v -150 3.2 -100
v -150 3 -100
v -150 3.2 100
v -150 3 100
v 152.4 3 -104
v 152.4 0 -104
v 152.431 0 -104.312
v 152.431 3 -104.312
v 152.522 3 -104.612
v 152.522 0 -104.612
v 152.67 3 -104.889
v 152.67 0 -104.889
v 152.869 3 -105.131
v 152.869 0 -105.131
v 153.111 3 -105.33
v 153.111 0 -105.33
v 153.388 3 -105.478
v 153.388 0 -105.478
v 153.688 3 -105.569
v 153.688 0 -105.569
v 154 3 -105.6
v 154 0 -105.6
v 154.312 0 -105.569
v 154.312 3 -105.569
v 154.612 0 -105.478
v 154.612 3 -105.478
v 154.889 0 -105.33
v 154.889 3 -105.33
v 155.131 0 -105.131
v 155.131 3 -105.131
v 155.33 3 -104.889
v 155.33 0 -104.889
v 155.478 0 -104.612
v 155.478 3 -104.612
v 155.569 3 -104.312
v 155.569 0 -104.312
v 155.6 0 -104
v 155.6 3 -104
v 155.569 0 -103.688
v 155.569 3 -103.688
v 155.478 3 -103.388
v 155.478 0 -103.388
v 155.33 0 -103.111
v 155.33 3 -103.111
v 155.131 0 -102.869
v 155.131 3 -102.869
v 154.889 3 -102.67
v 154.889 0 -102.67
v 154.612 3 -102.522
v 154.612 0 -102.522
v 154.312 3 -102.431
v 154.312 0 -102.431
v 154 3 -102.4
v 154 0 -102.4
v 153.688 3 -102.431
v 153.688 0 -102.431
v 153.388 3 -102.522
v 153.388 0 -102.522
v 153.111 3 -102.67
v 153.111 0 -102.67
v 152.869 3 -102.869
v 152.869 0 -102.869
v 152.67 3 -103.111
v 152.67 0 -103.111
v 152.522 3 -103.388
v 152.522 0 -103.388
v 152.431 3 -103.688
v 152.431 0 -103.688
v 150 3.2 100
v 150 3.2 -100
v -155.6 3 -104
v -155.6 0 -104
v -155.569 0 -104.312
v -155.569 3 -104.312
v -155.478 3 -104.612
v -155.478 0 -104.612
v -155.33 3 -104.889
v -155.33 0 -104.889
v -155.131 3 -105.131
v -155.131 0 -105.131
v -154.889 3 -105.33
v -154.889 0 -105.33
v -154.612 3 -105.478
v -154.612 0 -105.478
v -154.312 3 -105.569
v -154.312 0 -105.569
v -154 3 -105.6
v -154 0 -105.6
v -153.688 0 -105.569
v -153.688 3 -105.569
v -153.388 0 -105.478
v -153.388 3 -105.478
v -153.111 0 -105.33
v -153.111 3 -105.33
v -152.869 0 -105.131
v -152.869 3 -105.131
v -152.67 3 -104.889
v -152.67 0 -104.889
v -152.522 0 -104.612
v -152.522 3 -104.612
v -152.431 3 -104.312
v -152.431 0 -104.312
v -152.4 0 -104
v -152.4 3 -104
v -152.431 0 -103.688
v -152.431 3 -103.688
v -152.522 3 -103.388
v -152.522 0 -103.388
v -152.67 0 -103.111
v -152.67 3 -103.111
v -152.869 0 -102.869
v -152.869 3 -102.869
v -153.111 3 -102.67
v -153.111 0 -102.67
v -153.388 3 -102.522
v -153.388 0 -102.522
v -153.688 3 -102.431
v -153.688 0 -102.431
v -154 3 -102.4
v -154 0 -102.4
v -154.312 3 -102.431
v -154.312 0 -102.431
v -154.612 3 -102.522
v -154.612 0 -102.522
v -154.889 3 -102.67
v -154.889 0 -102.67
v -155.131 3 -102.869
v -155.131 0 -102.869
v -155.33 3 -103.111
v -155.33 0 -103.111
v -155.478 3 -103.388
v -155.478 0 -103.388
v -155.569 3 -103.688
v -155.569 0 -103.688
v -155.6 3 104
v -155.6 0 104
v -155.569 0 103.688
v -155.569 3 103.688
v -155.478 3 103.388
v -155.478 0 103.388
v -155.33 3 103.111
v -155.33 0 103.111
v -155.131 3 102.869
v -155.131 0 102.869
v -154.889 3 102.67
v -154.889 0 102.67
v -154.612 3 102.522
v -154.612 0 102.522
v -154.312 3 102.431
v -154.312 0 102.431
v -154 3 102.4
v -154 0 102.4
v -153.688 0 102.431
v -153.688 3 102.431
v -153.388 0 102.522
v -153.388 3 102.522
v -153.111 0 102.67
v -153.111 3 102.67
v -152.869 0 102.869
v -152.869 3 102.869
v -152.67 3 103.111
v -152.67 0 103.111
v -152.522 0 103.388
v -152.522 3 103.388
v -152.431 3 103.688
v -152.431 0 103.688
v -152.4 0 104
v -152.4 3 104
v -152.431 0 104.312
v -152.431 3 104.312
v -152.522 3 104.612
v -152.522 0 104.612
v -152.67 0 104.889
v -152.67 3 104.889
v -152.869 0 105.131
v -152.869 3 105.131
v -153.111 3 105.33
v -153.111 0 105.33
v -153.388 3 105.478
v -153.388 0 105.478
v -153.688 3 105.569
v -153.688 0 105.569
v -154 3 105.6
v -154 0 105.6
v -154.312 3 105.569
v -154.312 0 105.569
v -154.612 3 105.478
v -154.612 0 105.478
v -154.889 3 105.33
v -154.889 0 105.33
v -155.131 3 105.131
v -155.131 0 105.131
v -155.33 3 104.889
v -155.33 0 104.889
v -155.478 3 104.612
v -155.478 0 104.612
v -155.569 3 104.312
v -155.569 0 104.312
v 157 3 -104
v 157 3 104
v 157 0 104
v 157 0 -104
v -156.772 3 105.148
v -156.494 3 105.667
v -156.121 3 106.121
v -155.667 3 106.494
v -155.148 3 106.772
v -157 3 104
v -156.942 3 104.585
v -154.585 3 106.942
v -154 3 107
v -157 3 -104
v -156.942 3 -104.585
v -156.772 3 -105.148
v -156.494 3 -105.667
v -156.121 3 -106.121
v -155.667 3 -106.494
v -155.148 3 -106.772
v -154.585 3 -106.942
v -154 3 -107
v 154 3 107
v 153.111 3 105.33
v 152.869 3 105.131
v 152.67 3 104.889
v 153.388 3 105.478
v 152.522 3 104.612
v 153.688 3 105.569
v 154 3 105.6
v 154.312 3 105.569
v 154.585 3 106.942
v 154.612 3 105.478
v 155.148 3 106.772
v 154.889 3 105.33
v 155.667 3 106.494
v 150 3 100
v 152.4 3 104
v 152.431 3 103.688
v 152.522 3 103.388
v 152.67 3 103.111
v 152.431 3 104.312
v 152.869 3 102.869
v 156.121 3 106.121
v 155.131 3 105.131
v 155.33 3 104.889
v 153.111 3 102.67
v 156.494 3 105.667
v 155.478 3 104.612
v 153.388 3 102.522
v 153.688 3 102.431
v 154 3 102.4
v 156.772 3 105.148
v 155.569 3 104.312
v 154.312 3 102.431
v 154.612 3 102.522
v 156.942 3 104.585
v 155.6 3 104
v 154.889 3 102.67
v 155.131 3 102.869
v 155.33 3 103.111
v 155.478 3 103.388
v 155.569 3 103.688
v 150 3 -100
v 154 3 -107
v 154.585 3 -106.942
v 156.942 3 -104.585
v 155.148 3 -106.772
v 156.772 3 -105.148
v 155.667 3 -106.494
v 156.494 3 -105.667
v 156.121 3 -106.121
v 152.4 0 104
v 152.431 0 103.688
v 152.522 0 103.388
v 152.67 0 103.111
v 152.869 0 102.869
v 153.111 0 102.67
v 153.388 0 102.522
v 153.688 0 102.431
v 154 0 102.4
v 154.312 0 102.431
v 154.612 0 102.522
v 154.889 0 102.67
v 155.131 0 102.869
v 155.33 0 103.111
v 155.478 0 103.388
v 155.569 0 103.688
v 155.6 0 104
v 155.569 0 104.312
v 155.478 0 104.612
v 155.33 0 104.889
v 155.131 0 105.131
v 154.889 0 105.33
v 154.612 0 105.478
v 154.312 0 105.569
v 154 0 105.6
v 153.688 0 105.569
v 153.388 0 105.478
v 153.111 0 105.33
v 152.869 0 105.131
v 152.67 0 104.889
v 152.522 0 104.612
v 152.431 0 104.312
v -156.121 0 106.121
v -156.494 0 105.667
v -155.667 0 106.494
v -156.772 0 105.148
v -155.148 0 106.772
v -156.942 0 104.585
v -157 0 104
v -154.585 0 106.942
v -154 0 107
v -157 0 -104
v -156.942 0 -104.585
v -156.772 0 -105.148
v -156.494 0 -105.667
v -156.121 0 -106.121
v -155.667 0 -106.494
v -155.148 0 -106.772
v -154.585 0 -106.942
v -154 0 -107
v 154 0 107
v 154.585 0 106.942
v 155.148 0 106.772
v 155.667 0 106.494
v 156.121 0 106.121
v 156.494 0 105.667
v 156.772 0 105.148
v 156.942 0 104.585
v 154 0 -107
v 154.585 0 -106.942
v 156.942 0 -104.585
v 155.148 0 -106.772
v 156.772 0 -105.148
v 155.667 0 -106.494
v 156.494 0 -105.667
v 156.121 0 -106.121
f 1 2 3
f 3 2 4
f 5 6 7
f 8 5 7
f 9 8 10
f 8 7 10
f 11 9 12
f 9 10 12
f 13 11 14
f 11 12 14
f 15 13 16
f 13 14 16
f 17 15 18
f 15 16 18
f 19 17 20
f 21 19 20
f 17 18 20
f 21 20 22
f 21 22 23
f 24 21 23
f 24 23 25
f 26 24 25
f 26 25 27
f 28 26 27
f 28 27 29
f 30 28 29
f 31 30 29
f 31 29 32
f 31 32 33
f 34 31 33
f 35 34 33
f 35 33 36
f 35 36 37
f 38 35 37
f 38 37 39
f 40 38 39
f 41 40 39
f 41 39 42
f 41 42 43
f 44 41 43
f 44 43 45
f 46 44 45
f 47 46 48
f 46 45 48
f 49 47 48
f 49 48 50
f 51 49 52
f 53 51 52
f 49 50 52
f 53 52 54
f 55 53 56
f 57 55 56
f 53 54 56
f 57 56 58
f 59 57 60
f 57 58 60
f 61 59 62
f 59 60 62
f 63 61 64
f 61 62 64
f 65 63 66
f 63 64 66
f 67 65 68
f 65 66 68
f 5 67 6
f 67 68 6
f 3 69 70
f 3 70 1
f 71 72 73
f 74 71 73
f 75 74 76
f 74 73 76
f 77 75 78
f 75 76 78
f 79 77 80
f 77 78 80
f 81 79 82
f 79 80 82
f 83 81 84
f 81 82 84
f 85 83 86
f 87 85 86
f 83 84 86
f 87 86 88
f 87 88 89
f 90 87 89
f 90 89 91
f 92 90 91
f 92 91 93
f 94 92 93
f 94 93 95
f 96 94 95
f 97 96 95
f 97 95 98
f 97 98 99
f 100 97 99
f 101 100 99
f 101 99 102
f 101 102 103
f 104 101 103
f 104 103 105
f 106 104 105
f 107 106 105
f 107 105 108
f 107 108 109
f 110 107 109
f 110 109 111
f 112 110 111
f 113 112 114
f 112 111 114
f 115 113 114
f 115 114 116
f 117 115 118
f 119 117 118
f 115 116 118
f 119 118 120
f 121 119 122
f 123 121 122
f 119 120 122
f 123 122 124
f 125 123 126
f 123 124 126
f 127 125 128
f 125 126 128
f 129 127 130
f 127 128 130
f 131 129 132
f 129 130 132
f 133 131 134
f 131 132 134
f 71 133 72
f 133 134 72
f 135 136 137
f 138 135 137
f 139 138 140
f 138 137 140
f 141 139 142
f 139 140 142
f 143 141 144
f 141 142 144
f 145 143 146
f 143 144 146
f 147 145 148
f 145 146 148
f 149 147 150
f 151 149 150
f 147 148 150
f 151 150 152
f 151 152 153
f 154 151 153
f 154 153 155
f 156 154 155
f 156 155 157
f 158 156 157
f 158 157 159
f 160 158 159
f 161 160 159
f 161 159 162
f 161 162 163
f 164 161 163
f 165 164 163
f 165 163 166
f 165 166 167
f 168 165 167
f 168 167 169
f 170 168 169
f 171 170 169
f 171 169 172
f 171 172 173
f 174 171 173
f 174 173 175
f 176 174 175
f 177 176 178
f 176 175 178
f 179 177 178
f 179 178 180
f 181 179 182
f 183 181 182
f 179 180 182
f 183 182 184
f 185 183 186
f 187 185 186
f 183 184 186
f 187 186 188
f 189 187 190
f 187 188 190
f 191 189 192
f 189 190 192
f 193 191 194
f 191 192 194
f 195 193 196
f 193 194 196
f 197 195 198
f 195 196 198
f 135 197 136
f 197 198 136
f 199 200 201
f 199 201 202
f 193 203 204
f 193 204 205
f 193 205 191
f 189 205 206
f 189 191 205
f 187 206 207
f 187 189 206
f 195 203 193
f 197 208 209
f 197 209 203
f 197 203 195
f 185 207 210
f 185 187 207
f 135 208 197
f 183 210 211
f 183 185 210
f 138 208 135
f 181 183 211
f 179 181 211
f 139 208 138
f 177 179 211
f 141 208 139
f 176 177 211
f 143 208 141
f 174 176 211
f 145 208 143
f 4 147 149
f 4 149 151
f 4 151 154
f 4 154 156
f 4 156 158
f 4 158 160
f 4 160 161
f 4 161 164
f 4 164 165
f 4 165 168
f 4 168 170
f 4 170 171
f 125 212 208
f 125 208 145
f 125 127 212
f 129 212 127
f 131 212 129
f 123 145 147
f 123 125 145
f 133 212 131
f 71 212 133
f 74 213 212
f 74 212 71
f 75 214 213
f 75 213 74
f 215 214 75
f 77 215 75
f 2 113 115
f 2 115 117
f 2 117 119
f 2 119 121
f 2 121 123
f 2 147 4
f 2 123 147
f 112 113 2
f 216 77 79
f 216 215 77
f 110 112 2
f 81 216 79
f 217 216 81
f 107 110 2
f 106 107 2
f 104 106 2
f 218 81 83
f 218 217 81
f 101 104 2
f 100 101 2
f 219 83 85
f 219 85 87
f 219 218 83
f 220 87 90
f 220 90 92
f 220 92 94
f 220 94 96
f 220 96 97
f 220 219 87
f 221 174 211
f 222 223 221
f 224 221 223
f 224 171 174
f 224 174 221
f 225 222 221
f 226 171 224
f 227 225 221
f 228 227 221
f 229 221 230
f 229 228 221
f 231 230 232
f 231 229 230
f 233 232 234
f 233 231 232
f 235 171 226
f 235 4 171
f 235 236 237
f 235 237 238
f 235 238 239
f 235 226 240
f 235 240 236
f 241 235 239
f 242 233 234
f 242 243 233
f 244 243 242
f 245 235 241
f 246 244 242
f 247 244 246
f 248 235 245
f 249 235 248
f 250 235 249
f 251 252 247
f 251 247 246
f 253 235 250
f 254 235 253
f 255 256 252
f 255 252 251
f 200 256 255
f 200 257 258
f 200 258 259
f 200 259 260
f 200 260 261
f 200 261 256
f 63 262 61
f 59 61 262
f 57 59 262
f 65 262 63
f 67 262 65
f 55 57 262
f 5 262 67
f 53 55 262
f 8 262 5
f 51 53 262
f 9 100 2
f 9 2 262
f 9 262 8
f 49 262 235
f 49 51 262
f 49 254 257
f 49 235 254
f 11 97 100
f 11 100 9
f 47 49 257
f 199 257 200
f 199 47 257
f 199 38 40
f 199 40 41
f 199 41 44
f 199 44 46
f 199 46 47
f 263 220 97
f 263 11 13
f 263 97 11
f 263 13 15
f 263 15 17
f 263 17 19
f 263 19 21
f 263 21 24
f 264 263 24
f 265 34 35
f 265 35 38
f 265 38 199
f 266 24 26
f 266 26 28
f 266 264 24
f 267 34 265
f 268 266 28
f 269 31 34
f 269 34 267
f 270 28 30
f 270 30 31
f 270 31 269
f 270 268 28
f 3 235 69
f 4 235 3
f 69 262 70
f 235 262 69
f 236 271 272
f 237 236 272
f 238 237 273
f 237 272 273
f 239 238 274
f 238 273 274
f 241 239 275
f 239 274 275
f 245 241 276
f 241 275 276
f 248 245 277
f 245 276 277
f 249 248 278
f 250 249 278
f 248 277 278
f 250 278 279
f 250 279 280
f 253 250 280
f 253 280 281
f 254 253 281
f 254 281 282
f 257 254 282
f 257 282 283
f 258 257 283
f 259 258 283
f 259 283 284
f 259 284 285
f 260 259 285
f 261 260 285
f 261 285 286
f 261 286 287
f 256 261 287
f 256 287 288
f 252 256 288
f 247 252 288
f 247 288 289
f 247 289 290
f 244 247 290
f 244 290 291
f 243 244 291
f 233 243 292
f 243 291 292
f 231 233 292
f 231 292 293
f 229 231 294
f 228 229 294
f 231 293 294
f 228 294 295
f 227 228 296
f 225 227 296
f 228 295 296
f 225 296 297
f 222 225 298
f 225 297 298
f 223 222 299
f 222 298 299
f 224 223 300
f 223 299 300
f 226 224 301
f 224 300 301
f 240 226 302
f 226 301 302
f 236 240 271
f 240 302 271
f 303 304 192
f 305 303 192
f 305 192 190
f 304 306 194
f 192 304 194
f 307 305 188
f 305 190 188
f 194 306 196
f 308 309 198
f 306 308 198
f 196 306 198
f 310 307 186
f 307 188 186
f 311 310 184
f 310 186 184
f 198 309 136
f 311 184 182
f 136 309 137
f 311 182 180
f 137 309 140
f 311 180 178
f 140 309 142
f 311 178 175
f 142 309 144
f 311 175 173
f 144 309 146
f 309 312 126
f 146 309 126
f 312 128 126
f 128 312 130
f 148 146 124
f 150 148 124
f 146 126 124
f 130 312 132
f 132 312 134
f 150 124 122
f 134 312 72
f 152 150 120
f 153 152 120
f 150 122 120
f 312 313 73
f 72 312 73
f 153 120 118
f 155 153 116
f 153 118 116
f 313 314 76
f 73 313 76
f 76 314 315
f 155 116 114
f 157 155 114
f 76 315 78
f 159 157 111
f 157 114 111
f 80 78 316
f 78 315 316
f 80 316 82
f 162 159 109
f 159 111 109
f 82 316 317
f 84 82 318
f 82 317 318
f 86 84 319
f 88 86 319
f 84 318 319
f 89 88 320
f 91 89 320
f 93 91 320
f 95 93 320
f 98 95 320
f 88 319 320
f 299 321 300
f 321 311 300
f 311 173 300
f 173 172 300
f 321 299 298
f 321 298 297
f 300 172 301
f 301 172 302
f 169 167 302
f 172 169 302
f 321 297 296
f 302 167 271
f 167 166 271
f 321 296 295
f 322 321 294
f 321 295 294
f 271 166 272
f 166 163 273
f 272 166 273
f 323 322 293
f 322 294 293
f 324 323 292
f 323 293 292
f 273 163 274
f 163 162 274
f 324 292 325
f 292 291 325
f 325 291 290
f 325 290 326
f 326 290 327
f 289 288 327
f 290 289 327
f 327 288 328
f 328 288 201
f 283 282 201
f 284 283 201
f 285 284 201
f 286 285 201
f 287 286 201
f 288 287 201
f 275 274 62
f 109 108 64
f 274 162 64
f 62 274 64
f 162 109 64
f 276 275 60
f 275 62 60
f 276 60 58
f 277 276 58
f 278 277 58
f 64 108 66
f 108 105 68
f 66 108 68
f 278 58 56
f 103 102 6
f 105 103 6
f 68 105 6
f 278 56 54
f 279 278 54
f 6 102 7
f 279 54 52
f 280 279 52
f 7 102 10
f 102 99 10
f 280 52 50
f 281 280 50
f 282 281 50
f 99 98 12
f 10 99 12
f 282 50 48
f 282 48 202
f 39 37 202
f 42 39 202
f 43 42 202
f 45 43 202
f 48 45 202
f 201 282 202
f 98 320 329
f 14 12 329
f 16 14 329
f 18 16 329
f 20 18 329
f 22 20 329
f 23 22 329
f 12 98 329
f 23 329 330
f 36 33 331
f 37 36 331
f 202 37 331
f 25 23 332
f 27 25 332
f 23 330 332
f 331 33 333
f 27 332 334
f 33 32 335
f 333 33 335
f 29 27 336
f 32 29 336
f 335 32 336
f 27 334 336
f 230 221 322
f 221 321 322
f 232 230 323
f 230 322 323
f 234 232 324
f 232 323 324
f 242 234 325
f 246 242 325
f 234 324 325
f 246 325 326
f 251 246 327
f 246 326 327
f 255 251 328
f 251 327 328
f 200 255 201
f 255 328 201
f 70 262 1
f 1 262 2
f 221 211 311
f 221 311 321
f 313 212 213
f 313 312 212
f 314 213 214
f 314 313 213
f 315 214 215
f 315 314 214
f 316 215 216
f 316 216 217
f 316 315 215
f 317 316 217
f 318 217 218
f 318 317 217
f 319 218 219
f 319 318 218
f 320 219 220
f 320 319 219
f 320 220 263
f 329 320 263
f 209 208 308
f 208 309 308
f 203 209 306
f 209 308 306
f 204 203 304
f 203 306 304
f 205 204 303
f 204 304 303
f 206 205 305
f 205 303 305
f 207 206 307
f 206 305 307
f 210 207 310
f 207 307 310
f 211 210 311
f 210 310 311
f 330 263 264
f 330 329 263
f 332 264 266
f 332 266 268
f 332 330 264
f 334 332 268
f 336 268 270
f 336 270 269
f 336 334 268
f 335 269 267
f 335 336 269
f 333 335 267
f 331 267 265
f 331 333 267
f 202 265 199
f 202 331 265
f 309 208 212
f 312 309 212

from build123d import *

# Parameters (mm, degrees)
SKETCH1_W                      = 314
SKETCH1_H                      = 214
BOSS_EXTRUDE1_DEPTH            = 3
SKETCH2_W                      = 300
SKETCH2_H                      = 200
BOSS_EXTRUDE2_DEPTH            = 0.2
F_3_2_3_2_DIAMETER_HOLE1_D     = 3.2
F_3_2_3_2_DIAMETER_HOLE1_DEPTH = 3
FILLET1_R                      = 3


with BuildPart() as part:
    # Sketch1 → Boss-Extrude1 (new body)
    with BuildSketch(Plane(origin=(0, 3, 0), x_dir=(1, 0, 0), z_dir=(0, 1, 0))):
        Rectangle(SKETCH1_W, SKETCH1_H)
    extrude(amount=-BOSS_EXTRUDE1_DEPTH)

    # Sketch2 → Boss-Extrude2 (add)
    with BuildSketch(Plane(origin=(0, 3, 0), x_dir=(-1, 0, 0), z_dir=(0, 1, 0))):
        Rectangle(SKETCH2_W, SKETCH2_H)
    extrude(amount=BOSS_EXTRUDE2_DEPTH)

    # Ø3.2 (3.2) Diameter Hole1
    with Locations(Plane(origin=(0, 3, 0), x_dir=(1, 0, 0), z_dir=(0, 1, 0))):
        with Locations((154, -104), (-154, -104), (154, 104), (-154, 104)):
            Hole(F_3_2_3_2_DIAMETER_HOLE1_D / 2, depth=F_3_2_3_2_DIAMETER_HOLE1_DEPTH)

    # Fillet1
    fillet1_edges = [part.edges().sort_by_distance(p)[0] for p in [
        (157, 1.5, 107),
        (-157, 1.5, 107),
        (-157, 1.5, -107),
        (157, 1.5, -107),
    ]]
    fillet(fillet1_edges, radius=FILLET1_R)


solid = part.part
